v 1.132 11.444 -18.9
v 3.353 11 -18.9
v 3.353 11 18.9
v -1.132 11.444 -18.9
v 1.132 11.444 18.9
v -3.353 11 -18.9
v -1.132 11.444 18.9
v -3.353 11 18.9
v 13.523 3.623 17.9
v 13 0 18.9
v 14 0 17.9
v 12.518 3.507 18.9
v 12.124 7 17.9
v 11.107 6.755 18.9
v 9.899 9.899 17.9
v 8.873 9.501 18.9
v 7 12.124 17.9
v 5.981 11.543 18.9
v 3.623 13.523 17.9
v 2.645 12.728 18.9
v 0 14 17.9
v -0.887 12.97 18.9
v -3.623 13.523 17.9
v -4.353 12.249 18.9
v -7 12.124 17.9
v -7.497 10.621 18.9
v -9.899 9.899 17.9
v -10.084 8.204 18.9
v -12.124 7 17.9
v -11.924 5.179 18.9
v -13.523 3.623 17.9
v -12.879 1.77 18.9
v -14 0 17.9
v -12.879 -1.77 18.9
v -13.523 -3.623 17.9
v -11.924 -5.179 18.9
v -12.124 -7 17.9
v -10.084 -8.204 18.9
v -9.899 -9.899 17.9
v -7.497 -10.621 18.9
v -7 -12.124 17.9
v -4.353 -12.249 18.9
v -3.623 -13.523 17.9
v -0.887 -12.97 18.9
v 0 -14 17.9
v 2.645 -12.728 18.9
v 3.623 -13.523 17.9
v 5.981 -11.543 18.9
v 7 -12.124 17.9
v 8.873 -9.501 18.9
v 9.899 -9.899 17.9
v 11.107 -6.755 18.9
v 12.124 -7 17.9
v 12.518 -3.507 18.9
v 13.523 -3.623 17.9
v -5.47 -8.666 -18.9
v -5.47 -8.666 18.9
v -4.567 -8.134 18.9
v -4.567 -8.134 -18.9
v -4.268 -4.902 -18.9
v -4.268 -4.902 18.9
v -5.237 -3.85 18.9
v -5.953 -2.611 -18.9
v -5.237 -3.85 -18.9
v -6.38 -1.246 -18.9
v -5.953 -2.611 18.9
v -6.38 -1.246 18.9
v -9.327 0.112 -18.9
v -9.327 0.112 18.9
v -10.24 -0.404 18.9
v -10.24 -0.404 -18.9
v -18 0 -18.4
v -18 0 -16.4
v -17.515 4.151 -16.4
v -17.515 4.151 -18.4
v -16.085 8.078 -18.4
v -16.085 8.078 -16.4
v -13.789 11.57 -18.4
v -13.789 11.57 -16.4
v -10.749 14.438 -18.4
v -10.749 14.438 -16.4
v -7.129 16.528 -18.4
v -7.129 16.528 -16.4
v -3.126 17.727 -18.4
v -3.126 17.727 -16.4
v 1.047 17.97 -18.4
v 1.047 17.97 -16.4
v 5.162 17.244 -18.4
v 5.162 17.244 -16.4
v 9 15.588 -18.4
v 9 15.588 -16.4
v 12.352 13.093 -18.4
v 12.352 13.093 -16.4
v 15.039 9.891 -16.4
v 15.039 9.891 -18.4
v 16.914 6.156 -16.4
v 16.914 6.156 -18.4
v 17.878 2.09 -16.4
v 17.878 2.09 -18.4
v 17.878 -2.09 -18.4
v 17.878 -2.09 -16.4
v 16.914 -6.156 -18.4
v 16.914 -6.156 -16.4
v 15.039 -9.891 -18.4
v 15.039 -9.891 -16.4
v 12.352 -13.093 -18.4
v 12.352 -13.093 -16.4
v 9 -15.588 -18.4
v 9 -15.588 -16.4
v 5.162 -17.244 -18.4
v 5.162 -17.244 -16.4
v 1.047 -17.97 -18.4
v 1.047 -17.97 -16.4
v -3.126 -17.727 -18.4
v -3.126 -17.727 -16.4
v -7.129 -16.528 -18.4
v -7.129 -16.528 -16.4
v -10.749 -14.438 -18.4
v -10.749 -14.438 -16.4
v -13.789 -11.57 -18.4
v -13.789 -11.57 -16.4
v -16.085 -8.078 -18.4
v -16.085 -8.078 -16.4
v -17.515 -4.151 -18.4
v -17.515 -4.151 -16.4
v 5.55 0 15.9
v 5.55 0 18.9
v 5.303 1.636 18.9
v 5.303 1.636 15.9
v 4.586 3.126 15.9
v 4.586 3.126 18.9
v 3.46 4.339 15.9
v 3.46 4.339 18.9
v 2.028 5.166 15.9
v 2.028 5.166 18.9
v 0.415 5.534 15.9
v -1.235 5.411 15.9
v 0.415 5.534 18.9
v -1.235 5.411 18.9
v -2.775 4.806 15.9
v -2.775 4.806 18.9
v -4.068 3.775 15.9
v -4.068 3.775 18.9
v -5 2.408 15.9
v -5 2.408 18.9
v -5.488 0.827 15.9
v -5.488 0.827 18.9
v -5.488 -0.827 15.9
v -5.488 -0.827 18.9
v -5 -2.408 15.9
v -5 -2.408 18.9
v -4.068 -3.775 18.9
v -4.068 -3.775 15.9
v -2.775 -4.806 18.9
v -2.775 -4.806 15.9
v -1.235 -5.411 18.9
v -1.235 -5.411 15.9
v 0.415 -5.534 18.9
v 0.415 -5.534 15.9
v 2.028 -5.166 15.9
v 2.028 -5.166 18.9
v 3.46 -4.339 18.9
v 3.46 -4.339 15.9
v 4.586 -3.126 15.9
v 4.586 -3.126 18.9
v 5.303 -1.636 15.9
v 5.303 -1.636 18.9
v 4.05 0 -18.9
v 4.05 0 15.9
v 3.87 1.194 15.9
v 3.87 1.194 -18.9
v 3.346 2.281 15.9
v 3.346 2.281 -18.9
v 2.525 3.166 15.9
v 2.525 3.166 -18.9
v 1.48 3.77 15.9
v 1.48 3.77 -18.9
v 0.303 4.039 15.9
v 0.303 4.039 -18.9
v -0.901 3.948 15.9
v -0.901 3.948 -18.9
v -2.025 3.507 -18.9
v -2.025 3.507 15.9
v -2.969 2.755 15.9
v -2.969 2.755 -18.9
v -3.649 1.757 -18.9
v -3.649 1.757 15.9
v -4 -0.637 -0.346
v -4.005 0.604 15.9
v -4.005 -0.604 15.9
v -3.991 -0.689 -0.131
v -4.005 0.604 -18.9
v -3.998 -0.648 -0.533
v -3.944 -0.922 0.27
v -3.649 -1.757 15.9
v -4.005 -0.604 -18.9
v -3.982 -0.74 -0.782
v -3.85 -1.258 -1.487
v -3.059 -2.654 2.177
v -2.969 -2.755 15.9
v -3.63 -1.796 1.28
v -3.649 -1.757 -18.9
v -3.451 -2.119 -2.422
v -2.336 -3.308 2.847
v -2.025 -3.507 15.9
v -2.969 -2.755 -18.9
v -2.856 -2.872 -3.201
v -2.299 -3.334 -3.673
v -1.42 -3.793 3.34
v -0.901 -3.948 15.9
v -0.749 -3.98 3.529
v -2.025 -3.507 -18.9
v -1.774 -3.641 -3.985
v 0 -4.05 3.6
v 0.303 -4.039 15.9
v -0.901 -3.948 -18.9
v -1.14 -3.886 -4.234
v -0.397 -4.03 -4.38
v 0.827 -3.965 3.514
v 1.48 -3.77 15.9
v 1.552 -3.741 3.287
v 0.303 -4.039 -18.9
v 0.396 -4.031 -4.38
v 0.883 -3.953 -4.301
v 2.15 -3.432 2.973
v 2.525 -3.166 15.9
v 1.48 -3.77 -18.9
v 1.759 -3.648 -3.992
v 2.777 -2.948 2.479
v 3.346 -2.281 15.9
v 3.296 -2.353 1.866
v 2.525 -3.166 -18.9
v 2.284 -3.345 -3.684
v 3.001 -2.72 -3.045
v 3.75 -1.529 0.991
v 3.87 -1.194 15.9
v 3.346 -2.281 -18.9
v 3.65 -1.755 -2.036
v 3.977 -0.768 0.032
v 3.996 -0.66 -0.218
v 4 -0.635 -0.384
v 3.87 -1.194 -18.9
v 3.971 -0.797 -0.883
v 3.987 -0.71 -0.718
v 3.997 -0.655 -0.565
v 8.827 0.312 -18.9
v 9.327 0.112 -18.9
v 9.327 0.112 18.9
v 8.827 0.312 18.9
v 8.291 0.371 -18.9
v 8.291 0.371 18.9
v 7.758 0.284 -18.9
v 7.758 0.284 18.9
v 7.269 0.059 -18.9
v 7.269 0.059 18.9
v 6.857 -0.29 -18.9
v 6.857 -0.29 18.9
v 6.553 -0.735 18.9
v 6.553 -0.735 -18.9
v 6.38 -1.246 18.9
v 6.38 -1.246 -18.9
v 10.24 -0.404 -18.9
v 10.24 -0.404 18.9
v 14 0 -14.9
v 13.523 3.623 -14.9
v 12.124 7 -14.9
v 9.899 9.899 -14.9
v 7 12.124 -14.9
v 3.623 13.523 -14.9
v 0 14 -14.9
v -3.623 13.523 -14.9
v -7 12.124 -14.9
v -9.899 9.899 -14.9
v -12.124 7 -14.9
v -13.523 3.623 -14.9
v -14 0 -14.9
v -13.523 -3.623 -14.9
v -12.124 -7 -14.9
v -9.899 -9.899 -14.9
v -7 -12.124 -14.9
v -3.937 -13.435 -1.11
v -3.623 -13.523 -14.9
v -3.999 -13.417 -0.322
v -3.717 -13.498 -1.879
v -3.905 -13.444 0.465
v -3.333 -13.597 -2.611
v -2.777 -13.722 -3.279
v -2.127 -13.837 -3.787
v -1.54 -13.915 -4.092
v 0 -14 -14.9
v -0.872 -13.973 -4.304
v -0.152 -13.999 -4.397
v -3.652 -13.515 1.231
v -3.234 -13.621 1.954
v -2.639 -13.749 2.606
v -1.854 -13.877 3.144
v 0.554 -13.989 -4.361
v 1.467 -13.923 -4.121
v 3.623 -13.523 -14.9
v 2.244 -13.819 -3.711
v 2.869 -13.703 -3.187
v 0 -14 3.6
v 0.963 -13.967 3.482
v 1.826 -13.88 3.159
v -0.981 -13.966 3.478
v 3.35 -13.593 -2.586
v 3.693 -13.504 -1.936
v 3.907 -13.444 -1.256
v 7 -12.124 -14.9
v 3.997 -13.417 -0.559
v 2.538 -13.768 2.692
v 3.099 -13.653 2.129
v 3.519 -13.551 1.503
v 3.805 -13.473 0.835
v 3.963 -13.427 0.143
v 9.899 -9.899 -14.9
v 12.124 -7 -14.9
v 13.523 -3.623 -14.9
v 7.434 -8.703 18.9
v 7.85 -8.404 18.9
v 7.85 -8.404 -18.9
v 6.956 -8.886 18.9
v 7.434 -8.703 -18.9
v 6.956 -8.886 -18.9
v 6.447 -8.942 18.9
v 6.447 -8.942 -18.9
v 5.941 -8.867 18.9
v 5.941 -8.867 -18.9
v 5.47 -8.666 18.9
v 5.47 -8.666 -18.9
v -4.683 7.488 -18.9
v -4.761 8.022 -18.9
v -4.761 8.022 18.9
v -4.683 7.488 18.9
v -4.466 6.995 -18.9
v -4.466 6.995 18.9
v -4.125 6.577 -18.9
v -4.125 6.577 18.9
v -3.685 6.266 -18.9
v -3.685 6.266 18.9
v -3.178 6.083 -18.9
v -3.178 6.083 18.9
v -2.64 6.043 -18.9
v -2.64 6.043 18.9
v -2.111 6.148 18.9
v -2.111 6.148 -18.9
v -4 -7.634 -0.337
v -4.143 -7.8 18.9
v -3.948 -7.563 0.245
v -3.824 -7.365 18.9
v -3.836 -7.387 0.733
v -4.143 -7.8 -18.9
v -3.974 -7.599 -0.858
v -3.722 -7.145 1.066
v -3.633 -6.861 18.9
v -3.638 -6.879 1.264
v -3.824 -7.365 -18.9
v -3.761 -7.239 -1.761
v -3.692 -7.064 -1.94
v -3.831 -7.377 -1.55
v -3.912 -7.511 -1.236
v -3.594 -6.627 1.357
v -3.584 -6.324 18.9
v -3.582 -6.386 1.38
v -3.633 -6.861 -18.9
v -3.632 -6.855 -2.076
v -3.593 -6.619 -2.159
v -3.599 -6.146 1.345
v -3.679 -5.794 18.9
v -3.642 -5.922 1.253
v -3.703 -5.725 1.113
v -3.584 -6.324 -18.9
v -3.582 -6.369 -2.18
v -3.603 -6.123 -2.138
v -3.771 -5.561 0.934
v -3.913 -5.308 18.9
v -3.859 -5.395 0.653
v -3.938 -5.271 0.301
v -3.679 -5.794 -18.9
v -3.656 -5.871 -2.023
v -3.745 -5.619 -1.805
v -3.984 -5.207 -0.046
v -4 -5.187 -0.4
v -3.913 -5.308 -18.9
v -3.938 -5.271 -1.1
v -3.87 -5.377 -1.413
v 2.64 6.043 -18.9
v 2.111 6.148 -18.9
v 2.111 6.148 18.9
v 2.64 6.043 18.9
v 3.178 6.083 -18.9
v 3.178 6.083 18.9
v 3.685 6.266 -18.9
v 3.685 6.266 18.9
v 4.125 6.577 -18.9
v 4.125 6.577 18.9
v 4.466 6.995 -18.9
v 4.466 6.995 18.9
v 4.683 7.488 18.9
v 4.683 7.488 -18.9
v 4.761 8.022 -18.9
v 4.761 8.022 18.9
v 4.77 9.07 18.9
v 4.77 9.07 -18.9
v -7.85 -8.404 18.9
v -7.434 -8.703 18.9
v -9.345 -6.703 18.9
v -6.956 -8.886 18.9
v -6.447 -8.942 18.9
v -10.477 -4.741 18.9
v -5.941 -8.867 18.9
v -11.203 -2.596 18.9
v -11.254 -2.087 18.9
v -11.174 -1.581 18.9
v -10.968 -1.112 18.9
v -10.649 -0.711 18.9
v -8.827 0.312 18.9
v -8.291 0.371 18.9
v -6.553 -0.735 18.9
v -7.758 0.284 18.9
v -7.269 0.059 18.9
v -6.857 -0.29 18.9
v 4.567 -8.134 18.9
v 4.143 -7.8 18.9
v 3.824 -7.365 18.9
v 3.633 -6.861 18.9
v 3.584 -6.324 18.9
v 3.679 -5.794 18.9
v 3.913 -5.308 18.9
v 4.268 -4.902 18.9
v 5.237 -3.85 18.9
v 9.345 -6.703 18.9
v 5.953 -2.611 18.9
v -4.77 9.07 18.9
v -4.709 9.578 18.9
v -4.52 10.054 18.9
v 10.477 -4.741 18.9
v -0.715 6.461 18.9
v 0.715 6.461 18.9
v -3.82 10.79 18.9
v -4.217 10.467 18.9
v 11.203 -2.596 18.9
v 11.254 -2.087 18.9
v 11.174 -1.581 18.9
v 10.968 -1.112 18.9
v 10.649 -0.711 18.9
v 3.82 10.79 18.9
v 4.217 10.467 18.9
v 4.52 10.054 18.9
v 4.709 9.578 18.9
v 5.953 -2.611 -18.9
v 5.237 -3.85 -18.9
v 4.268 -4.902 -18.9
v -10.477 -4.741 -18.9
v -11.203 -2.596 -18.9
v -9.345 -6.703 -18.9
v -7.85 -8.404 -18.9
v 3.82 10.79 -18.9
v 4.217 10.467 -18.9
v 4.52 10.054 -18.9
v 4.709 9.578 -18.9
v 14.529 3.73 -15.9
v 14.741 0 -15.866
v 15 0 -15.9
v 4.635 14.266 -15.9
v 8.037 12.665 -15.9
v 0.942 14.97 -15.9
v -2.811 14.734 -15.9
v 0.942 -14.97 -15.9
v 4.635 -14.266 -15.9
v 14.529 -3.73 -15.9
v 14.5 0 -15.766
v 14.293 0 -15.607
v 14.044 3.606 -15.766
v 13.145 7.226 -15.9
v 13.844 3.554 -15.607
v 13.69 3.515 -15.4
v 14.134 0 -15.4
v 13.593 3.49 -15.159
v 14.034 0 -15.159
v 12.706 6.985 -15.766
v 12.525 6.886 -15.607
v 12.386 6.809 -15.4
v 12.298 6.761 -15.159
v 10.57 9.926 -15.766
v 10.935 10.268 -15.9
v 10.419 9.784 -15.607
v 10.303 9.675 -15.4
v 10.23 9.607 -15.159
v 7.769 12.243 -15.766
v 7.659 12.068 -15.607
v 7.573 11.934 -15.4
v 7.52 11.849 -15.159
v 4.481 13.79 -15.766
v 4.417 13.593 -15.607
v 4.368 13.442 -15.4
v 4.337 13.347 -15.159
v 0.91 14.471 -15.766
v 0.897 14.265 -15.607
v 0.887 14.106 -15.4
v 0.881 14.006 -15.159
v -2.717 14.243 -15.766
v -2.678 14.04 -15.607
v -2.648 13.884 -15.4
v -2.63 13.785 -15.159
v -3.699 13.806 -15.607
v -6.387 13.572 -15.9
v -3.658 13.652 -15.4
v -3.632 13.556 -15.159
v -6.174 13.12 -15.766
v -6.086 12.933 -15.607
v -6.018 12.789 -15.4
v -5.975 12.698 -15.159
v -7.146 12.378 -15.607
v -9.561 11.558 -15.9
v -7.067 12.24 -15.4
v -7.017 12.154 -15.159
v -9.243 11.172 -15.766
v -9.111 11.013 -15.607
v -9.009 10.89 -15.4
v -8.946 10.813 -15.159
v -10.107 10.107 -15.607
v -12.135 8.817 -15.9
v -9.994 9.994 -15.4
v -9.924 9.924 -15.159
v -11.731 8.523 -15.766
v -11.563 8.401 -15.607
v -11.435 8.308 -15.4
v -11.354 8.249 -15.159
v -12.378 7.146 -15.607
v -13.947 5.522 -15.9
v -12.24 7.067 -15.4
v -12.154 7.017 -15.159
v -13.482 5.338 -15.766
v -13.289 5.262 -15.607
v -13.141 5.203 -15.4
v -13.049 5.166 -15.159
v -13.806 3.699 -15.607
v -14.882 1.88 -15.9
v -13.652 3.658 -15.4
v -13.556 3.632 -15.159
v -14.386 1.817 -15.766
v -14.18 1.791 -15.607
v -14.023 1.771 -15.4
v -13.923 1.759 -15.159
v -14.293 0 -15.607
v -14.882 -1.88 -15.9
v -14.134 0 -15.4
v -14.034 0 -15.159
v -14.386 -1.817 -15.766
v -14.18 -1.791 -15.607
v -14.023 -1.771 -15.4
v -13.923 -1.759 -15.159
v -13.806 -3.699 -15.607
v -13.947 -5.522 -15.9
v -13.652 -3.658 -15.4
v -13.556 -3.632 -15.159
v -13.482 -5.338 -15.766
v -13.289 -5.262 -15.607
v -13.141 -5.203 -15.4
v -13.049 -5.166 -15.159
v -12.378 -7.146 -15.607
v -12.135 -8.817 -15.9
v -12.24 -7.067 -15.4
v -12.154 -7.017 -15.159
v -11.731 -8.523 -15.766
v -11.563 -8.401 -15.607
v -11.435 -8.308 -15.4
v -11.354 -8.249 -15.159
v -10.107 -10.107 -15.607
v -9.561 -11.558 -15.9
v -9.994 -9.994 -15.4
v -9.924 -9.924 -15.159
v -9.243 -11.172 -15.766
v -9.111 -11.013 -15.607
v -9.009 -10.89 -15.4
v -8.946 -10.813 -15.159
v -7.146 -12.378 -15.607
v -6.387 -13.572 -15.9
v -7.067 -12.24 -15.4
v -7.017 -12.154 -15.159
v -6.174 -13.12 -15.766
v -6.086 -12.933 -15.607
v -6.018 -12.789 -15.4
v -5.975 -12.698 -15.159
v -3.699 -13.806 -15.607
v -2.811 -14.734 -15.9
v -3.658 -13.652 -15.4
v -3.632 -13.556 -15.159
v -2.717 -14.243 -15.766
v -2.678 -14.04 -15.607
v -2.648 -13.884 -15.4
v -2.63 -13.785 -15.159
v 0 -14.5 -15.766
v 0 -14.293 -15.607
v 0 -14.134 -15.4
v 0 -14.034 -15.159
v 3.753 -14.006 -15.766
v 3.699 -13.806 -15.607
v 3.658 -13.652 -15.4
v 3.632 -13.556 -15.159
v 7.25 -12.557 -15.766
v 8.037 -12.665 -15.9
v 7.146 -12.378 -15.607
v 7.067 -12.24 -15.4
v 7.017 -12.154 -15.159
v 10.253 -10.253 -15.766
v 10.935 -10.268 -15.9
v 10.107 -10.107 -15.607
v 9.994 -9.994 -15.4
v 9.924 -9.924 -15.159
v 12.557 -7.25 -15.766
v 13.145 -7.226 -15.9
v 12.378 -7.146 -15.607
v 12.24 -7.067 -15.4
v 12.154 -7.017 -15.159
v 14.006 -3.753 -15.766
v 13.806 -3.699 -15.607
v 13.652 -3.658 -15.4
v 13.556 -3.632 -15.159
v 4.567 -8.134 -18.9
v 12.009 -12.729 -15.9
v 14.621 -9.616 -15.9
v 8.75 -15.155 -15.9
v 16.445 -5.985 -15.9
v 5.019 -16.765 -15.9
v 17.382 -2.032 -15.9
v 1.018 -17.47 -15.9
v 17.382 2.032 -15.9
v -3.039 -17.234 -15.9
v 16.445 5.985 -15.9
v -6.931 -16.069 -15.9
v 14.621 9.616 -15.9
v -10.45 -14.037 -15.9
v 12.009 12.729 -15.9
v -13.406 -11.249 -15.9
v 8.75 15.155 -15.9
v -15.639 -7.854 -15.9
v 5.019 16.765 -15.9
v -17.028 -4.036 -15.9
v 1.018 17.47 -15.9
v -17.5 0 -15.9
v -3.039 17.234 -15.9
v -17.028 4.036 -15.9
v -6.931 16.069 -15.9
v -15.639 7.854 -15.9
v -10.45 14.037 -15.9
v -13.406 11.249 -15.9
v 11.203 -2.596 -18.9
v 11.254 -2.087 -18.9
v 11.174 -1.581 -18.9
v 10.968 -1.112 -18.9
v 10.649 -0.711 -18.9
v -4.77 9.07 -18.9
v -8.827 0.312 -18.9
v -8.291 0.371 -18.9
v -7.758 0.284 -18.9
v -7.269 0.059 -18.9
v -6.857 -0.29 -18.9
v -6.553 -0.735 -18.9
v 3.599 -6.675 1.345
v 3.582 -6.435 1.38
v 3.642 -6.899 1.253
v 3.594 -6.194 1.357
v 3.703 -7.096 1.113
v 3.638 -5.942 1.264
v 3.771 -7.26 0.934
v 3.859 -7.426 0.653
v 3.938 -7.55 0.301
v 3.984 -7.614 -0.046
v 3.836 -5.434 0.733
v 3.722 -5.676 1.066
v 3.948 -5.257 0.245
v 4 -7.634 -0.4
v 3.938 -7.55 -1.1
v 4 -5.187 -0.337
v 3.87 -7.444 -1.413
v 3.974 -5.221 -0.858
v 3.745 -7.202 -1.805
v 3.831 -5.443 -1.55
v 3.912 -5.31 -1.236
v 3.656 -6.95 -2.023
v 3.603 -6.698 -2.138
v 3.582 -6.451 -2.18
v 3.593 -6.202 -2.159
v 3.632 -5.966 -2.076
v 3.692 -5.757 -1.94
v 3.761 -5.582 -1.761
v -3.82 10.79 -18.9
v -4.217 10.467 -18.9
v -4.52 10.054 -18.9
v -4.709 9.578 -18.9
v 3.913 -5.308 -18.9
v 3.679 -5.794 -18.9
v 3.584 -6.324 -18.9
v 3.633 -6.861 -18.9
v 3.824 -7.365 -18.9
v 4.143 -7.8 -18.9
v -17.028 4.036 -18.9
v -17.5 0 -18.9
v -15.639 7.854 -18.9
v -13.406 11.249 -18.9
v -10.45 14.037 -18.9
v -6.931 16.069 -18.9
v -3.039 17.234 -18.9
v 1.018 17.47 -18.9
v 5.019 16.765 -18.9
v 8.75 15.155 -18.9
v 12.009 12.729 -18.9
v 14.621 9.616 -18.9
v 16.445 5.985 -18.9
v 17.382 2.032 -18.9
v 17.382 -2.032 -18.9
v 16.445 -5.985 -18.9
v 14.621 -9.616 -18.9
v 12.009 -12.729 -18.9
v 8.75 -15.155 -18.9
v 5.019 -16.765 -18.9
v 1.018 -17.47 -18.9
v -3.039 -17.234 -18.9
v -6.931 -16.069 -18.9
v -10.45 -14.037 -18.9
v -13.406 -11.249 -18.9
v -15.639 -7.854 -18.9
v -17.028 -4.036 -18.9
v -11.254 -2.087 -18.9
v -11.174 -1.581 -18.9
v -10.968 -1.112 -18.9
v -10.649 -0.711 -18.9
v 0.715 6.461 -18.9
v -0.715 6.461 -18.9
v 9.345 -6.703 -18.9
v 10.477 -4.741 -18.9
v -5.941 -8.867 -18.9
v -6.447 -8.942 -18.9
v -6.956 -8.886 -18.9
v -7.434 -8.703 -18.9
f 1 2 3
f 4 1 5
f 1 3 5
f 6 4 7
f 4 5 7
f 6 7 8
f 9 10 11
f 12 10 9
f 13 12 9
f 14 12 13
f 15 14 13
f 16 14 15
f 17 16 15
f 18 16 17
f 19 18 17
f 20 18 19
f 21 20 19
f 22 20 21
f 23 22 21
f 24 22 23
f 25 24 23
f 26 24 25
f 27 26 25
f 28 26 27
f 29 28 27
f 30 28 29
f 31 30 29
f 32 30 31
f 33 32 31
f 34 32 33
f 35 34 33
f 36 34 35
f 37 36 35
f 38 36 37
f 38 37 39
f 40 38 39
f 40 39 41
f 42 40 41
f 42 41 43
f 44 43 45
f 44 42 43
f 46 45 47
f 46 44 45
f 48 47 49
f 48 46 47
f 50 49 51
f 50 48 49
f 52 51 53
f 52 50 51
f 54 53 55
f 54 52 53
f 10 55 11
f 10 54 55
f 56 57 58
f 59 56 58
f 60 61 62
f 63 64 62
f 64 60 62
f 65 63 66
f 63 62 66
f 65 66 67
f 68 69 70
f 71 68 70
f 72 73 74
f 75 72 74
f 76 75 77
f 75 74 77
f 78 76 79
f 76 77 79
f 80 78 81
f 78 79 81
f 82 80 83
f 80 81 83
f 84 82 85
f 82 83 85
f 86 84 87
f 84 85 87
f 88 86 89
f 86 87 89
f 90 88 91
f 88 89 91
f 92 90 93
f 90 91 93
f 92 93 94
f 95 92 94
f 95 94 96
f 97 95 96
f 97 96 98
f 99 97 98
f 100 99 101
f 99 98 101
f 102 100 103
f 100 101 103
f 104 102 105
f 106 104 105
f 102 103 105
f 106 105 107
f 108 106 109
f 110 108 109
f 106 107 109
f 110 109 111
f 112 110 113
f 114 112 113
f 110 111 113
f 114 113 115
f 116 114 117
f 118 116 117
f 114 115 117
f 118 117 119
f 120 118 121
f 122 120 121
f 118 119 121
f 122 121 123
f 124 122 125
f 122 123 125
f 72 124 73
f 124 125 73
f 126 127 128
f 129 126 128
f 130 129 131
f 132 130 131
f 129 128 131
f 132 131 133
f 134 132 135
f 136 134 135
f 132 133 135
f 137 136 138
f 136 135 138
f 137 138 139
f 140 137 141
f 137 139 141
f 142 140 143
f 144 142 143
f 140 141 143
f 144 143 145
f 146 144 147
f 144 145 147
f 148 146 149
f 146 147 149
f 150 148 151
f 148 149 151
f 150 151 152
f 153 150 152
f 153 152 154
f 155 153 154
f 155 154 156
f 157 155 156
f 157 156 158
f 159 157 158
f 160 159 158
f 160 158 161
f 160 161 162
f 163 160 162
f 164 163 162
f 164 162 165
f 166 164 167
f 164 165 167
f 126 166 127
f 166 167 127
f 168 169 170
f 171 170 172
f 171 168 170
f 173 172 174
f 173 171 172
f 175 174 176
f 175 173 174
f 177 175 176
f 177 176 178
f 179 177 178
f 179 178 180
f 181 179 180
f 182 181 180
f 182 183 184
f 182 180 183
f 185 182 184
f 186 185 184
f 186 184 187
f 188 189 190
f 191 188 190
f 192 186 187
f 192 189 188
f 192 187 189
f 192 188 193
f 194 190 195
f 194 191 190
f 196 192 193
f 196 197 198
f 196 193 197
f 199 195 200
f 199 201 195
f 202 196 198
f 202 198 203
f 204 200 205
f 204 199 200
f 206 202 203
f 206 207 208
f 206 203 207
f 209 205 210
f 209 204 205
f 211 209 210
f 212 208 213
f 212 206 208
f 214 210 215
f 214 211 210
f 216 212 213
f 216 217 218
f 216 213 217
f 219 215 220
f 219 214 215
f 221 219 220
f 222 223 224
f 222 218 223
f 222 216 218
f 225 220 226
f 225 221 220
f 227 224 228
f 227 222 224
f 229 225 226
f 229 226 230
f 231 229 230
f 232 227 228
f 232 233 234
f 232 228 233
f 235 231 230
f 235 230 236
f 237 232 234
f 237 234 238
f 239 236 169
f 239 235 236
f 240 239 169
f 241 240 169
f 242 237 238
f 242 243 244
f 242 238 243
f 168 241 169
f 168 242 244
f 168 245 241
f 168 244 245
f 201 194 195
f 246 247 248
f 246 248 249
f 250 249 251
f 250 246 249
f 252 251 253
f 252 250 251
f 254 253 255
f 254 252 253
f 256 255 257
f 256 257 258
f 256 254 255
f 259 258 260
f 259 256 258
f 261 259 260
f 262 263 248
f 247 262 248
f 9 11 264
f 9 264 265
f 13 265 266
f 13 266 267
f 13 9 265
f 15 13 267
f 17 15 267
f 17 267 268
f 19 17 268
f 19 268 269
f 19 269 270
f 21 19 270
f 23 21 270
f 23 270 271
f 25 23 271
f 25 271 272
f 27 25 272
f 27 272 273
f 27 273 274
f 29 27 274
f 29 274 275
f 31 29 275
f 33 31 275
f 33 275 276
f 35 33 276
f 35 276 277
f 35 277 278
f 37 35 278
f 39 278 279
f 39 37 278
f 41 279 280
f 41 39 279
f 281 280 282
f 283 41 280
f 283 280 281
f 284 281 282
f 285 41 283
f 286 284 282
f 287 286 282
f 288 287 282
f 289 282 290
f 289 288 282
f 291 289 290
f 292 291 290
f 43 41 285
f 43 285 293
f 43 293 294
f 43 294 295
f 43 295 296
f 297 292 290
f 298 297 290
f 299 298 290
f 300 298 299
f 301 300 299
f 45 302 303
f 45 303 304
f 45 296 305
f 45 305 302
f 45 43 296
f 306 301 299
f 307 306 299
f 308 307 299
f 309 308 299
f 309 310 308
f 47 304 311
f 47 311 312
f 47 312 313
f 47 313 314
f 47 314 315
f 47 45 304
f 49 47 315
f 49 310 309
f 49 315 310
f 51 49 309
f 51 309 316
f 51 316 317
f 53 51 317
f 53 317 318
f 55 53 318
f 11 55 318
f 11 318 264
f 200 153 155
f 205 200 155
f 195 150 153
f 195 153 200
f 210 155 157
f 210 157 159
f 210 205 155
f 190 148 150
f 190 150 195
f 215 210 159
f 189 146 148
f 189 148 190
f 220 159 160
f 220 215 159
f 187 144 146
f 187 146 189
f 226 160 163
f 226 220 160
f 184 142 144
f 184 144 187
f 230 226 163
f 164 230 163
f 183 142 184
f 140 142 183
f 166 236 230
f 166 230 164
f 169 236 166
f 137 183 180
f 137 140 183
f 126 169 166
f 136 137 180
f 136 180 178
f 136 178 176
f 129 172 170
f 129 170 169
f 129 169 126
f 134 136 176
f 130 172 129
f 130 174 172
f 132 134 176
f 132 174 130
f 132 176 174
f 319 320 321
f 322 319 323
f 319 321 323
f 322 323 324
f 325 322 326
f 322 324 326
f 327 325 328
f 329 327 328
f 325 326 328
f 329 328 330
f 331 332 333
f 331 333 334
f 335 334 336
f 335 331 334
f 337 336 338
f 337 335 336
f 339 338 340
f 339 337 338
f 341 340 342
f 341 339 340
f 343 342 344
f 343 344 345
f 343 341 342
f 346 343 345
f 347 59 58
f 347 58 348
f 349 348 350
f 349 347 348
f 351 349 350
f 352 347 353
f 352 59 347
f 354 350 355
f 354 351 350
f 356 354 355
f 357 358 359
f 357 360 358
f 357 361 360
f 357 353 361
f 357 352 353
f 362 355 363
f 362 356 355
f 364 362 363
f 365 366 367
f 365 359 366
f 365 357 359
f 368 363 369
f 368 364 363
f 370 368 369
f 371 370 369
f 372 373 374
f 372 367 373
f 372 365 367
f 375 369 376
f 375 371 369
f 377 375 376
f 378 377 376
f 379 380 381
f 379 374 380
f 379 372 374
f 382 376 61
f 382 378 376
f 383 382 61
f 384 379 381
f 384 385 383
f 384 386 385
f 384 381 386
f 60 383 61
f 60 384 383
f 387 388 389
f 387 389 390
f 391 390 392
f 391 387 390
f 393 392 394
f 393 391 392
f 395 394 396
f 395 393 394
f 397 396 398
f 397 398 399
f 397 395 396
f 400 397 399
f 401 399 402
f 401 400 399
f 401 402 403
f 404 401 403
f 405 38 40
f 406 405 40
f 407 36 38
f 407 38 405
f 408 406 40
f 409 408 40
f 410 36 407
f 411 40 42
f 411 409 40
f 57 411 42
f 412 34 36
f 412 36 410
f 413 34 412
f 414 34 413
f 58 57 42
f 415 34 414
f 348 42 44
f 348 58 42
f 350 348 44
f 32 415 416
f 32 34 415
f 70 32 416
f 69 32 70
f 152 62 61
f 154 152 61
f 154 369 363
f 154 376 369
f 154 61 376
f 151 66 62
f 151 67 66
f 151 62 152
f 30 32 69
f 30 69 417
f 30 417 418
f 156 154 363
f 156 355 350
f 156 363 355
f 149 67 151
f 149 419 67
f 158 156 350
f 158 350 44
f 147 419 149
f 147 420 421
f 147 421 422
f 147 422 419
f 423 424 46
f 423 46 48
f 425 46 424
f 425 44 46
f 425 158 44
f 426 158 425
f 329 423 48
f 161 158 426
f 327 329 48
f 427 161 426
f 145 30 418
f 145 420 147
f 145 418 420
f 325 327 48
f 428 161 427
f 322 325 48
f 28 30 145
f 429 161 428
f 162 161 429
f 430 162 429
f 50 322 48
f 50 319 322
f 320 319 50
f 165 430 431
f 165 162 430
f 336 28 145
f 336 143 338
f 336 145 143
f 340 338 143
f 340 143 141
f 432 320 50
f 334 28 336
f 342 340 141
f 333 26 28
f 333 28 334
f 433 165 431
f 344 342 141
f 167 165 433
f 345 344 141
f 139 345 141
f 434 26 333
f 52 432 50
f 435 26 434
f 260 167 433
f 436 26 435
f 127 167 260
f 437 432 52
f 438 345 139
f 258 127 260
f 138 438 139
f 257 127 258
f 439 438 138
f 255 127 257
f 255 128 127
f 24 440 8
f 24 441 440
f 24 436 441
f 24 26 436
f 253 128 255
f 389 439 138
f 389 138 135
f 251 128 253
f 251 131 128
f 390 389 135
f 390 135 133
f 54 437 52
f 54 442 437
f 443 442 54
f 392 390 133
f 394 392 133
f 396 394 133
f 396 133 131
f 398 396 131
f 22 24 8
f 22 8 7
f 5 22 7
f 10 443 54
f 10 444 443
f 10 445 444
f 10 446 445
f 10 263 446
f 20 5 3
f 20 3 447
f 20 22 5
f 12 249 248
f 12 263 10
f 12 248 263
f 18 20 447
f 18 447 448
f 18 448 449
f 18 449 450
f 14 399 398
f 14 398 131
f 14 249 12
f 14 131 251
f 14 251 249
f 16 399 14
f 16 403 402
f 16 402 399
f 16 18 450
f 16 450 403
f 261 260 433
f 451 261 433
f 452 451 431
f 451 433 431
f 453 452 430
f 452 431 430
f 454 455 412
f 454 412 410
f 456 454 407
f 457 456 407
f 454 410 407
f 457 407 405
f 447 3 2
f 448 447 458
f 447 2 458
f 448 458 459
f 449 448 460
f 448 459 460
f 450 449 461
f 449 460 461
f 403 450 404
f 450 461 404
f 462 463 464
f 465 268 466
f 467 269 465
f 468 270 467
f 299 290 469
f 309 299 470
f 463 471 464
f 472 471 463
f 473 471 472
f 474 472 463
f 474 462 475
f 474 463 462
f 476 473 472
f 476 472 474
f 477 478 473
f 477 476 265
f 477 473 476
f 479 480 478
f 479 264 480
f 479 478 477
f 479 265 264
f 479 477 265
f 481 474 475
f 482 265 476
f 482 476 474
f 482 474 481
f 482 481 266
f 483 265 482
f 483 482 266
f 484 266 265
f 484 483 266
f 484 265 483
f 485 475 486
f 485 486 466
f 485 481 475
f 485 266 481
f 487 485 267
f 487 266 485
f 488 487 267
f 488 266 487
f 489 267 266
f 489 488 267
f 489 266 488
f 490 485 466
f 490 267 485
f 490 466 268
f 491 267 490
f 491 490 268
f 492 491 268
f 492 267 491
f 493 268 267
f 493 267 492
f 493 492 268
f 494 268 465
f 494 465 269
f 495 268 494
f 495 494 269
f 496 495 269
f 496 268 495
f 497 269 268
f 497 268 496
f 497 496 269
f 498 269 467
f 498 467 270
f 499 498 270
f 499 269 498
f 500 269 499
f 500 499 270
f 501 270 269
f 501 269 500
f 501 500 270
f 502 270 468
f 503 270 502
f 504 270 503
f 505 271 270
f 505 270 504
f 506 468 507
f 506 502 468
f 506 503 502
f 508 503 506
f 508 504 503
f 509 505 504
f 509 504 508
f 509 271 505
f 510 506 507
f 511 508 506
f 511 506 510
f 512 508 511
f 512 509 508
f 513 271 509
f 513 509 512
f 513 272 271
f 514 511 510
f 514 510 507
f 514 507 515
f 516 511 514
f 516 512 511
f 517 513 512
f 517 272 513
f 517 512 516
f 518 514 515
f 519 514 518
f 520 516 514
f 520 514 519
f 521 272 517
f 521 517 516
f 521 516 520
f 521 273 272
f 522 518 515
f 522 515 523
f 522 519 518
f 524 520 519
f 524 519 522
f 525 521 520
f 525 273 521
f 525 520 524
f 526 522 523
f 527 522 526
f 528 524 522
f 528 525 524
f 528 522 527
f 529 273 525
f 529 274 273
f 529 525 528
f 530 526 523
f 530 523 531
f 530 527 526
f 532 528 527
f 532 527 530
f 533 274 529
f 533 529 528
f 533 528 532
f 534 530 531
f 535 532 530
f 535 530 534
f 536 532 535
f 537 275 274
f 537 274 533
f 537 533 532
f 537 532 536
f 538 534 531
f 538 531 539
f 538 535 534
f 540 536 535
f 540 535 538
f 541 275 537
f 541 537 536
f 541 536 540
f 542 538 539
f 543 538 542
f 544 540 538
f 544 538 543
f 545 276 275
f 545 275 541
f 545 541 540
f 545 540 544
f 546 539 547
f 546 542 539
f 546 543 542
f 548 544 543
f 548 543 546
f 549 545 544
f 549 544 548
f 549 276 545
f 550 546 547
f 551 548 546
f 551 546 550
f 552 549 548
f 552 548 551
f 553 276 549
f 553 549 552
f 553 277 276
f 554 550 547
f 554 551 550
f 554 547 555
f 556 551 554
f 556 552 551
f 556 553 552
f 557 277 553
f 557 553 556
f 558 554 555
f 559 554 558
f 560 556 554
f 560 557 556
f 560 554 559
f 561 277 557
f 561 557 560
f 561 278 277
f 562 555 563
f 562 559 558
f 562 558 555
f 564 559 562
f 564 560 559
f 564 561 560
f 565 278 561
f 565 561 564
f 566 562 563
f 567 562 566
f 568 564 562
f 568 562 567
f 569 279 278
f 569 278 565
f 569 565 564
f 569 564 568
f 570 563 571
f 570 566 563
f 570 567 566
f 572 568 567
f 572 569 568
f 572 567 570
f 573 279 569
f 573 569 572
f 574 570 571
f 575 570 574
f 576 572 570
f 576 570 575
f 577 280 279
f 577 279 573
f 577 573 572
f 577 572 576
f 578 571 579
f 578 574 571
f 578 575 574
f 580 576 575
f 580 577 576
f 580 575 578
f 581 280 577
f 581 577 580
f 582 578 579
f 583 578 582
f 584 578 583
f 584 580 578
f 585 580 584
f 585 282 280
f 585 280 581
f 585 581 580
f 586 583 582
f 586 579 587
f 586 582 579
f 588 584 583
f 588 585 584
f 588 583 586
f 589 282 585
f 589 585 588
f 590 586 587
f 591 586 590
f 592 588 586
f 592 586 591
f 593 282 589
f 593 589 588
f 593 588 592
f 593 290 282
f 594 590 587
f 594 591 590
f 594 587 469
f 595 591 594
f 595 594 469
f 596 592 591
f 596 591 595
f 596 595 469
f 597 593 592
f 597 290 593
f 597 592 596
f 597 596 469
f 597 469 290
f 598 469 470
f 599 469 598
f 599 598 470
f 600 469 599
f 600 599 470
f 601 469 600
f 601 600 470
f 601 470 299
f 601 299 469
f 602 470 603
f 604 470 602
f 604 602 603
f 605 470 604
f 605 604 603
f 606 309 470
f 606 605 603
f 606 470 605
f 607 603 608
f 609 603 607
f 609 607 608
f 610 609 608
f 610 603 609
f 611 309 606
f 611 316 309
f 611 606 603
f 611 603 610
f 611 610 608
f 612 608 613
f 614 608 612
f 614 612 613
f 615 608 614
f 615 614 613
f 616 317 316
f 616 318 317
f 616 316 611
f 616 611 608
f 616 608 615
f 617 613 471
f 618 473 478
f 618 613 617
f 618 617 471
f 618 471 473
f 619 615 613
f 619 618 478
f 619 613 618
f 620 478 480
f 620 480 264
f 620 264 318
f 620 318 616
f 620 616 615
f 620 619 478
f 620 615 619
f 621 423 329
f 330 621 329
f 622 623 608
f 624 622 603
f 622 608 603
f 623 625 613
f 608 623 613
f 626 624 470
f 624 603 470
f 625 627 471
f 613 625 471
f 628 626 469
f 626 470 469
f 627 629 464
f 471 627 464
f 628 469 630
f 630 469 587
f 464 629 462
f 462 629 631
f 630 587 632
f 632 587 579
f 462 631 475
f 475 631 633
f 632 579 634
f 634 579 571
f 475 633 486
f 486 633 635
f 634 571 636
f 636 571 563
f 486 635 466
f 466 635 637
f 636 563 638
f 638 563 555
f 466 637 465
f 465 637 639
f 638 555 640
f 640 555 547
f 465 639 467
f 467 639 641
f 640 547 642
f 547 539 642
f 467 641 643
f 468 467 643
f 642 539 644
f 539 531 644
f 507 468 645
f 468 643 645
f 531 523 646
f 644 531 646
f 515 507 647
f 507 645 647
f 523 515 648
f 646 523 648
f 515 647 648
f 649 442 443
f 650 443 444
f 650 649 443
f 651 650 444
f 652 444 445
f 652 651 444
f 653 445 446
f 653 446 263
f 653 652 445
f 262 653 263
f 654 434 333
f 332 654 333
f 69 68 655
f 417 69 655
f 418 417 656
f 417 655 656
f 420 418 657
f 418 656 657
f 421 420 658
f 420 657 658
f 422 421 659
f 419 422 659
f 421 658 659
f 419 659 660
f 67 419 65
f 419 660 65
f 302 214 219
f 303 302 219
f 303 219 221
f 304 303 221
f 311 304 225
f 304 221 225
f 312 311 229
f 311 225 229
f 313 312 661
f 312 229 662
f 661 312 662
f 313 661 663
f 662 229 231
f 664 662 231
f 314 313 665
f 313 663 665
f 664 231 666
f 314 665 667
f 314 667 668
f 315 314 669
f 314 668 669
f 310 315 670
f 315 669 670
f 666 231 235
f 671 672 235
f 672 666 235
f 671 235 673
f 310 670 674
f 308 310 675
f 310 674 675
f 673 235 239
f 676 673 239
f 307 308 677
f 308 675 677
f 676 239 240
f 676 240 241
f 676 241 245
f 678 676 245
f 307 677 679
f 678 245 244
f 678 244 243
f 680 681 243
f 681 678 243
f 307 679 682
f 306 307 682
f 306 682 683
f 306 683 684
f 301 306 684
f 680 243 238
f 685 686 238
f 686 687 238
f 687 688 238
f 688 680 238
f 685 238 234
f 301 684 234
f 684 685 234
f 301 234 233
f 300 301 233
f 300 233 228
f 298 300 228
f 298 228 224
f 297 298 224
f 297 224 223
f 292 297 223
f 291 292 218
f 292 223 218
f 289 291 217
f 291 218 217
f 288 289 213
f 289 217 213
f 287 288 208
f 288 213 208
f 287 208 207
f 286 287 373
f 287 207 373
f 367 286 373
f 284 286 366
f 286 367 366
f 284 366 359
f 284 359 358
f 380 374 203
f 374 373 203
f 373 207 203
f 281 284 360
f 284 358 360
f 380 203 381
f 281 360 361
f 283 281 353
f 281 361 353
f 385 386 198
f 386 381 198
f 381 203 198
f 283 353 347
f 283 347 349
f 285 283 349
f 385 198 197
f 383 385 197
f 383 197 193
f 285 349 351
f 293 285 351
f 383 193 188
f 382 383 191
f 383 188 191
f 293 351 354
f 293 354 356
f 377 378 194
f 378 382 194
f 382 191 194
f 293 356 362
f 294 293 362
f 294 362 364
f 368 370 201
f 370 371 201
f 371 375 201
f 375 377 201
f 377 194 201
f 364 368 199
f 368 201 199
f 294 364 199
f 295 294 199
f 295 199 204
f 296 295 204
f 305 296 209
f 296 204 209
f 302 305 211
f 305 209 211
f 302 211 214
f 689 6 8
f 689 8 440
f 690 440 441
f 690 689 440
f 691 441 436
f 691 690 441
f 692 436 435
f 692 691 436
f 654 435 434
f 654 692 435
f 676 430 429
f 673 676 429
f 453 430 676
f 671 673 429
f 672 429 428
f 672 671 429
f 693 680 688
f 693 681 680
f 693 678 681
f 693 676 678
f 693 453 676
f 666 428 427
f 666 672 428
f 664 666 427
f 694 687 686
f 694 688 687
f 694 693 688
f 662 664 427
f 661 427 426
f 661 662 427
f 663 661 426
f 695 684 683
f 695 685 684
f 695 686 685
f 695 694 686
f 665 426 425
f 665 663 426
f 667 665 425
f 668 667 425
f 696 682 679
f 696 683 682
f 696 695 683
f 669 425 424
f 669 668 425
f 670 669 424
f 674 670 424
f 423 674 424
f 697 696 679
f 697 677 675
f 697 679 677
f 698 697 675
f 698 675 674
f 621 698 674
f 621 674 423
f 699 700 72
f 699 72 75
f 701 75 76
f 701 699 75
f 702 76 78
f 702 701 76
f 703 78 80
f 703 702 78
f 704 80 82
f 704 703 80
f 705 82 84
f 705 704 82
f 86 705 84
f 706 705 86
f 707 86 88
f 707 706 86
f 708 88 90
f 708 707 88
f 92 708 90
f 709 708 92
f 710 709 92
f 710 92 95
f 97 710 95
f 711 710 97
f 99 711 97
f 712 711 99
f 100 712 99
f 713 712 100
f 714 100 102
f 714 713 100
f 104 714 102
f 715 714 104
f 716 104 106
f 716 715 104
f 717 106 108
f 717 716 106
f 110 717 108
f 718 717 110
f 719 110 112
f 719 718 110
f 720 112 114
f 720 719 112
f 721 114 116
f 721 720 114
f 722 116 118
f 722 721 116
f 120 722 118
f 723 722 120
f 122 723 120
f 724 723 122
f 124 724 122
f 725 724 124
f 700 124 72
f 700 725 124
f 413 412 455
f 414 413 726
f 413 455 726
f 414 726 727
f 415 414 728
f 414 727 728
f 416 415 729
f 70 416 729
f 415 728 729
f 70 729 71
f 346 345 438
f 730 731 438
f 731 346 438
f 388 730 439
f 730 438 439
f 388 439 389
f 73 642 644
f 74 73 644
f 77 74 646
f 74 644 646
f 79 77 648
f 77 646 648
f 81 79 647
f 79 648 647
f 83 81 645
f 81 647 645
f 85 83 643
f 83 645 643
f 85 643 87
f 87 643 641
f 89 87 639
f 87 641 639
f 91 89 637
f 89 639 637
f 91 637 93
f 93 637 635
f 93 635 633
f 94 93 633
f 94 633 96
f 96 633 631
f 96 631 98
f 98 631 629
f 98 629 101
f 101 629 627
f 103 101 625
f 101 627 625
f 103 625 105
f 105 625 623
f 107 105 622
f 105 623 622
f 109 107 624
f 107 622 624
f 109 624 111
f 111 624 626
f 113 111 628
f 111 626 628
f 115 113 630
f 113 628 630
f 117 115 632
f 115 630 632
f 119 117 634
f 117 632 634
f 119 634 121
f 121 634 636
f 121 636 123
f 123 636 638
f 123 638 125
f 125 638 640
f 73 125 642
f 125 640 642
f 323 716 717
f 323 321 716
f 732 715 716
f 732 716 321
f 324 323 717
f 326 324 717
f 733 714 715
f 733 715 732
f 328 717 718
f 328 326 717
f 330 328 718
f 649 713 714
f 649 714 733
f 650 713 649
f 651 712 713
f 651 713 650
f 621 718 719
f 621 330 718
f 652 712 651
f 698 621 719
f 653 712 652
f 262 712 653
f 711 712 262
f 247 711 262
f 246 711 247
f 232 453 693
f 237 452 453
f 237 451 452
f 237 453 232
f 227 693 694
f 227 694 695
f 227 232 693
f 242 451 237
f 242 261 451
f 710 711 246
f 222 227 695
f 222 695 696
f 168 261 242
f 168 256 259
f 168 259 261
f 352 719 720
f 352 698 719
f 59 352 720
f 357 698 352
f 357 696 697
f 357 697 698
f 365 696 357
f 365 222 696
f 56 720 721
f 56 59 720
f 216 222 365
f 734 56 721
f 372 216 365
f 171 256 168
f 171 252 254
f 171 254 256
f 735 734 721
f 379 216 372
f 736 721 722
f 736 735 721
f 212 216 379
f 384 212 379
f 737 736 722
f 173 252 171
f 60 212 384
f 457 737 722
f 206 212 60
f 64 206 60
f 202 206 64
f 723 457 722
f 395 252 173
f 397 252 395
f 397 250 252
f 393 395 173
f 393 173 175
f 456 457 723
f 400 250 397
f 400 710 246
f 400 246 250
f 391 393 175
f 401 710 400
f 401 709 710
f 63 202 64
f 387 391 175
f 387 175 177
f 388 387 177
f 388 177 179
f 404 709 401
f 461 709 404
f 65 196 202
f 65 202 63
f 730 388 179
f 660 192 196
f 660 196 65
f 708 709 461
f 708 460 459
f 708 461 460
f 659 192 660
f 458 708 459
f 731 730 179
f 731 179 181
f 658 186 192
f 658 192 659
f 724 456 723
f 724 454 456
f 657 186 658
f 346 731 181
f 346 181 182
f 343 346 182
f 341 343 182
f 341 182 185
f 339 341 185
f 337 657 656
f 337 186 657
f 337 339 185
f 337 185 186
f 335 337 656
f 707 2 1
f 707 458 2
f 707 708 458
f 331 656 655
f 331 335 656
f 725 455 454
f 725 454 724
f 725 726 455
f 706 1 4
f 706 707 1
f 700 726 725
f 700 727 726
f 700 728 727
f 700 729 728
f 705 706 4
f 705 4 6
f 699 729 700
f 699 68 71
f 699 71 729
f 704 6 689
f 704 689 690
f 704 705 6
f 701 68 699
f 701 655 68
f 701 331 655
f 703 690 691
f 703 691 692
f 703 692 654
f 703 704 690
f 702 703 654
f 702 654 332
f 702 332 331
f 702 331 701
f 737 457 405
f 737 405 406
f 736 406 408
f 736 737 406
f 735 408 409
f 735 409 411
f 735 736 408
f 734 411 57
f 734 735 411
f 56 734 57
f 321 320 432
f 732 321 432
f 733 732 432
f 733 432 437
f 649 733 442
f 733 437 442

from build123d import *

# Parameters (mm, degrees)
CROQUIS1_R              = 14
CROQUIS1_R_2            = 4.05
SALIENTE_EXTRUIR1_DEPTH = 18.9
CHAFL_N1_SIZE           = 1
CORTAR_EXTRUIR1_REACH   = 44.671
REDONDEO1_R             = 2
MATRIZC1_COUNT          = 3
REDONDEO1_OF_MATRIZC1_R = 2
CROQUIS3_R              = 4
CORTAR_EXTRUIR2_DEPTH   = 29
SALIENTE_EXTRUIR2_START = -3
CROQUIS6_R              = 18
CROQUIS6_R_2            = 4.05
SALIENTE_EXTRUIR2_DEPTH = 3
CHAFL_N2_SIZE           = 0.5
REDONDEO2_R             = 1
CROQUIS12_R             = 5.55
CORTAR_EXTRUIR4_DEPTH   = 3


with BuildPart() as part:
    # Croquis1 → Saliente-Extruir1 (new, symmetric)
    with BuildSketch(Plane(origin=(0, 0, 0), x_dir=(0, 1, 0), z_dir=(0, 0, 1))):
        with Locations(Location((0, 0, 0), (0, 0, 270))):
            Circle(CROQUIS1_R)
        with Locations(Location((0, 0, 0), (0, 0, 270))):
            Circle(CROQUIS1_R_2, mode=Mode.SUBTRACT)
    extrude(amount=SALIENTE_EXTRUIR1_DEPTH, both=True)

    # Chaflán1
    chafl_n1_edges = [part.edges().sort_by_distance(p)[0] for p in [
        (-14, 0, 18.9),
    ]]
    chamfer(chafl_n1_edges, length=CHAFL_N1_SIZE)

    # Croquis2 → Cortar-Extruir1 (cut, up to next)
    with BuildSketch(Plane.XY.offset(18.9), mode=Mode.PRIVATE) as cortar_extruir1_sk1:
        with BuildLine():
            Line((4.729506573, 4.458897574), (4.781865786, 10.458669113))
            ThreePointArc((4.781865786, 10.458669113), (0, 11.5), (-4.781865786, 10.458669113))
            Line((-4.781865786, 10.458669113), (-4.729506573, 4.458897574))
            ThreePointArc((-4.729506573, 4.458897574), (0, 6.5), (4.729506573, 4.458897574))
        make_face()
    cortar_extruir1_tool1 = extrude(cortar_extruir1_sk1.sketch, amount=-CORTAR_EXTRUIR1_REACH, mode=Mode.PRIVATE) & part.part
    cortar_extruir1 = cortar_extruir1_tool1.solids().sort_by_distance((0, 8.49359, 18.9))[0]
    add(cortar_extruir1, mode=Mode.SUBTRACT)

    # Redondeo1
    redondeo1_edges = [part.edges().sort_by_distance(p)[0] for p in [
        (4.729506573, 4.458897574, 0),
        (-4.729506573, 4.458897574, 0),
        (-4.781865786, 10.458669113, 0),
        (4.781865786, 10.458669113, 0),
    ]]
    fillet(redondeo1_edges, radius=REDONDEO1_R)

    # MatrizC1: Cortar-Extruir1 ×3 about axis
    matrizc1_axis = Axis((0, 0, 0), (0, 0, 1))
    for i in range(1, MATRIZC1_COUNT):
        add(cortar_extruir1.rotate(matrizc1_axis, i * 360 / MATRIZC1_COUNT), mode=Mode.SUBTRACT)

    # Redondeo1 of MatrizC1
    redondeo1_of_matrizc1_edges = [part.edges().sort_by_distance(p)[0] for p in [
        (-6.226271859, 1.866424052, 0),
        (-1.496765286, -6.325321627, 0),
        (-6.666540248, -9.370551804, 0),
        (-11.448406034, -1.088117308, 0),
        (1.496765286, -6.325321627, 0),
        (6.226271859, 1.866424052, 0),
        (11.448406034, -1.088117308, 0),
        (6.666540248, -9.370551804, 0),
    ]]
    fillet(redondeo1_of_matrizc1_edges, radius=REDONDEO1_OF_MATRIZC1_R)

    # Croquis3 → Cortar-Extruir2 (cut)
    with BuildSketch(Plane(origin=(0, 0, 0), x_dir=(-1, 0, 0), z_dir=(0, 1, 0))):
        with Locations(Location((0, -0.4, 0), (0, 0, 90))):
            Circle(CROQUIS3_R)
    extrude(amount=-CORTAR_EXTRUIR2_DEPTH, mode=Mode.SUBTRACT)

    # Croquis6 → Saliente-Extruir2 (add)
    with BuildSketch(Plane(origin=(0, 0, -18.9), x_dir=(1, 0, 0), z_dir=(0, 0, -1)).offset(SALIENTE_EXTRUIR2_START)):
        with Locations(Location((0, 0, 0), (0, 0, 180))):
            Circle(CROQUIS6_R)
        Circle(CROQUIS6_R_2, mode=Mode.SUBTRACT)
        with BuildLine():
            Line((-10.239546073, 0.40417725), (-9.32733269, -0.111928251))
            ThreePointArc((-9.32733269, -0.111928251), (-7.50591795, -0.187849628), (-6.379547789, 1.245540049))
            ThreePointArc((-6.379547789, 1.245540049), (-5.629165125, 3.25), (-4.268443218, 4.902080425))
            ThreePointArc((-4.268443218, 4.902080425), (-3.590276425, 6.594240438), (-4.566733636, 8.133671184))
            Line((-4.566733636, 8.133671184), (-5.469800803, 8.665618398))
            ThreePointArc((-5.469800803, 8.665618398), (-6.703454741, 8.930380198), (-7.850114903, 8.403909567))
            ThreePointArc((-7.850114903, 8.403909567), (-9.959292144, 5.75), (-11.203056628, 2.596444145))
            ThreePointArc((-11.203056628, 2.596444145), (-11.085663488, 1.340172), (-10.239546073, 0.40417725))
        make_face(mode=Mode.SUBTRACT)
        with BuildLine():
            Line((5.469800803, 8.665618398), (4.566733636, 8.133671184))
            ThreePointArc((4.566733636, 8.133671184), (3.590276425, 6.594240438), (4.268443218, 4.902080425))
            ThreePointArc((4.268443218, 4.902080425), (5.629165125, 3.25), (6.379547789, 1.245540049))
            ThreePointArc((6.379547789, 1.245540049), (7.50591795, -0.187849628), (9.32733269, -0.111928251))
            Line((9.32733269, -0.111928251), (10.239546073, 0.40417725))
            ThreePointArc((10.239546073, 0.40417725), (11.085663488, 1.340172), (11.203056628, 2.596444145))
            ThreePointArc((11.203056628, 2.596444145), (9.959292144, 5.75), (7.850114903, 8.403909567))
            ThreePointArc((7.850114903, 8.403909567), (6.703454741, 8.930380198), (5.469800803, 8.665618398))
        make_face(mode=Mode.SUBTRACT)
        with BuildLine():
            Line((-4.760599053, -8.021742934), (-4.769745271, -9.069795648))
            ThreePointArc((-4.769745271, -9.069795648), (-4.382208746, -10.270552198), (-3.352941725, -11.000353712))
            ThreePointArc((-3.352941725, -11.000353712), (0, -11.5), (3.352941725, -11.000353712))
            ThreePointArc((3.352941725, -11.000353712), (4.382208746, -10.270552198), (4.769745271, -9.069795648))
            Line((4.769745271, -9.069795648), (4.760599053, -8.021742934))
            ThreePointArc((4.760599053, -8.021742934), (3.915641525, -6.40639081), (2.11110457, -6.147620474))
            ThreePointArc((2.11110457, -6.147620474), (0, -6.5), (-2.11110457, -6.147620474))
            ThreePointArc((-2.11110457, -6.147620474), (-3.915641525, -6.40639081), (-4.760599053, -8.021742934))
        make_face(mode=Mode.SUBTRACT)
    extrude(amount=SALIENTE_EXTRUIR2_DEPTH)

    # Chaflán2
    chafl_n2_edges = [part.edges().sort_by_distance(p)[0] for p in [
        (18, 0, -18.9),
        (18, 0, -15.9),
    ]]
    chamfer(chafl_n2_edges, length=CHAFL_N2_SIZE)

    # Redondeo2
    redondeo2_edges = [part.edges().sort_by_distance(p)[0] for p in [
        (-14, 0, -15.9),
    ]]
    fillet(redondeo2_edges, radius=REDONDEO2_R)

    # Croquis12 → Cortar-Extruir4 (cut)
    with BuildSketch(Plane.XY.offset(18.9)):
        Circle(CROQUIS12_R)
    extrude(amount=-CORTAR_EXTRUIR4_DEPTH, mode=Mode.SUBTRACT)


solid = part.part
